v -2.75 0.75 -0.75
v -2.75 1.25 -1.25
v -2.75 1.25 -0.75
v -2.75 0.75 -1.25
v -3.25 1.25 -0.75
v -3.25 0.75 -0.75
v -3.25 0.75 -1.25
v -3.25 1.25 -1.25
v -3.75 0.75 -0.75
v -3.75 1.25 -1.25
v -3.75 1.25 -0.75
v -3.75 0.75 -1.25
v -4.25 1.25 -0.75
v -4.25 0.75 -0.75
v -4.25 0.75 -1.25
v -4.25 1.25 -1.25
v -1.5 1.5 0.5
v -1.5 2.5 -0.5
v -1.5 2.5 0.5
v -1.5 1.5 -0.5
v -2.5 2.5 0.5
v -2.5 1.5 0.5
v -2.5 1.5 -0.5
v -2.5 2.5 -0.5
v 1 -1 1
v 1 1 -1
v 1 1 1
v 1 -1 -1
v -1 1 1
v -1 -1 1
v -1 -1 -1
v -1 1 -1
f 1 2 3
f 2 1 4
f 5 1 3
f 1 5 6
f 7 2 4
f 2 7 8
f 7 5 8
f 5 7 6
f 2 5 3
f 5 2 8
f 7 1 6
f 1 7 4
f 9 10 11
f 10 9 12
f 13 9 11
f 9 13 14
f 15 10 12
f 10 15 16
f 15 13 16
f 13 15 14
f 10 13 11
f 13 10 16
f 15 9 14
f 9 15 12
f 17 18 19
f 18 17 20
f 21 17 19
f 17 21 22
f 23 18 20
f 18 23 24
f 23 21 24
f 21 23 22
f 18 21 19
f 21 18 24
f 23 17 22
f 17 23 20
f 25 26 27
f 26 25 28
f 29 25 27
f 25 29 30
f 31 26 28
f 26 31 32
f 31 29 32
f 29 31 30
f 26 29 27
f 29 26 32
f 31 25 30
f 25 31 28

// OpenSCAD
$center=[0,0,0];
$lbound=[-0,-0,-0];
$ubound=[0,0,0];

box(2,a=[0,0,0])
box(1,a=[1,-1,0]) 
box(0.5,a=[1,1,1])
box(0.5,a=[1,0,0])
;

module box(s,a)
{



translate($center)cube(s,center=true);
$center= $center+a*-s*2;
 children();


}
